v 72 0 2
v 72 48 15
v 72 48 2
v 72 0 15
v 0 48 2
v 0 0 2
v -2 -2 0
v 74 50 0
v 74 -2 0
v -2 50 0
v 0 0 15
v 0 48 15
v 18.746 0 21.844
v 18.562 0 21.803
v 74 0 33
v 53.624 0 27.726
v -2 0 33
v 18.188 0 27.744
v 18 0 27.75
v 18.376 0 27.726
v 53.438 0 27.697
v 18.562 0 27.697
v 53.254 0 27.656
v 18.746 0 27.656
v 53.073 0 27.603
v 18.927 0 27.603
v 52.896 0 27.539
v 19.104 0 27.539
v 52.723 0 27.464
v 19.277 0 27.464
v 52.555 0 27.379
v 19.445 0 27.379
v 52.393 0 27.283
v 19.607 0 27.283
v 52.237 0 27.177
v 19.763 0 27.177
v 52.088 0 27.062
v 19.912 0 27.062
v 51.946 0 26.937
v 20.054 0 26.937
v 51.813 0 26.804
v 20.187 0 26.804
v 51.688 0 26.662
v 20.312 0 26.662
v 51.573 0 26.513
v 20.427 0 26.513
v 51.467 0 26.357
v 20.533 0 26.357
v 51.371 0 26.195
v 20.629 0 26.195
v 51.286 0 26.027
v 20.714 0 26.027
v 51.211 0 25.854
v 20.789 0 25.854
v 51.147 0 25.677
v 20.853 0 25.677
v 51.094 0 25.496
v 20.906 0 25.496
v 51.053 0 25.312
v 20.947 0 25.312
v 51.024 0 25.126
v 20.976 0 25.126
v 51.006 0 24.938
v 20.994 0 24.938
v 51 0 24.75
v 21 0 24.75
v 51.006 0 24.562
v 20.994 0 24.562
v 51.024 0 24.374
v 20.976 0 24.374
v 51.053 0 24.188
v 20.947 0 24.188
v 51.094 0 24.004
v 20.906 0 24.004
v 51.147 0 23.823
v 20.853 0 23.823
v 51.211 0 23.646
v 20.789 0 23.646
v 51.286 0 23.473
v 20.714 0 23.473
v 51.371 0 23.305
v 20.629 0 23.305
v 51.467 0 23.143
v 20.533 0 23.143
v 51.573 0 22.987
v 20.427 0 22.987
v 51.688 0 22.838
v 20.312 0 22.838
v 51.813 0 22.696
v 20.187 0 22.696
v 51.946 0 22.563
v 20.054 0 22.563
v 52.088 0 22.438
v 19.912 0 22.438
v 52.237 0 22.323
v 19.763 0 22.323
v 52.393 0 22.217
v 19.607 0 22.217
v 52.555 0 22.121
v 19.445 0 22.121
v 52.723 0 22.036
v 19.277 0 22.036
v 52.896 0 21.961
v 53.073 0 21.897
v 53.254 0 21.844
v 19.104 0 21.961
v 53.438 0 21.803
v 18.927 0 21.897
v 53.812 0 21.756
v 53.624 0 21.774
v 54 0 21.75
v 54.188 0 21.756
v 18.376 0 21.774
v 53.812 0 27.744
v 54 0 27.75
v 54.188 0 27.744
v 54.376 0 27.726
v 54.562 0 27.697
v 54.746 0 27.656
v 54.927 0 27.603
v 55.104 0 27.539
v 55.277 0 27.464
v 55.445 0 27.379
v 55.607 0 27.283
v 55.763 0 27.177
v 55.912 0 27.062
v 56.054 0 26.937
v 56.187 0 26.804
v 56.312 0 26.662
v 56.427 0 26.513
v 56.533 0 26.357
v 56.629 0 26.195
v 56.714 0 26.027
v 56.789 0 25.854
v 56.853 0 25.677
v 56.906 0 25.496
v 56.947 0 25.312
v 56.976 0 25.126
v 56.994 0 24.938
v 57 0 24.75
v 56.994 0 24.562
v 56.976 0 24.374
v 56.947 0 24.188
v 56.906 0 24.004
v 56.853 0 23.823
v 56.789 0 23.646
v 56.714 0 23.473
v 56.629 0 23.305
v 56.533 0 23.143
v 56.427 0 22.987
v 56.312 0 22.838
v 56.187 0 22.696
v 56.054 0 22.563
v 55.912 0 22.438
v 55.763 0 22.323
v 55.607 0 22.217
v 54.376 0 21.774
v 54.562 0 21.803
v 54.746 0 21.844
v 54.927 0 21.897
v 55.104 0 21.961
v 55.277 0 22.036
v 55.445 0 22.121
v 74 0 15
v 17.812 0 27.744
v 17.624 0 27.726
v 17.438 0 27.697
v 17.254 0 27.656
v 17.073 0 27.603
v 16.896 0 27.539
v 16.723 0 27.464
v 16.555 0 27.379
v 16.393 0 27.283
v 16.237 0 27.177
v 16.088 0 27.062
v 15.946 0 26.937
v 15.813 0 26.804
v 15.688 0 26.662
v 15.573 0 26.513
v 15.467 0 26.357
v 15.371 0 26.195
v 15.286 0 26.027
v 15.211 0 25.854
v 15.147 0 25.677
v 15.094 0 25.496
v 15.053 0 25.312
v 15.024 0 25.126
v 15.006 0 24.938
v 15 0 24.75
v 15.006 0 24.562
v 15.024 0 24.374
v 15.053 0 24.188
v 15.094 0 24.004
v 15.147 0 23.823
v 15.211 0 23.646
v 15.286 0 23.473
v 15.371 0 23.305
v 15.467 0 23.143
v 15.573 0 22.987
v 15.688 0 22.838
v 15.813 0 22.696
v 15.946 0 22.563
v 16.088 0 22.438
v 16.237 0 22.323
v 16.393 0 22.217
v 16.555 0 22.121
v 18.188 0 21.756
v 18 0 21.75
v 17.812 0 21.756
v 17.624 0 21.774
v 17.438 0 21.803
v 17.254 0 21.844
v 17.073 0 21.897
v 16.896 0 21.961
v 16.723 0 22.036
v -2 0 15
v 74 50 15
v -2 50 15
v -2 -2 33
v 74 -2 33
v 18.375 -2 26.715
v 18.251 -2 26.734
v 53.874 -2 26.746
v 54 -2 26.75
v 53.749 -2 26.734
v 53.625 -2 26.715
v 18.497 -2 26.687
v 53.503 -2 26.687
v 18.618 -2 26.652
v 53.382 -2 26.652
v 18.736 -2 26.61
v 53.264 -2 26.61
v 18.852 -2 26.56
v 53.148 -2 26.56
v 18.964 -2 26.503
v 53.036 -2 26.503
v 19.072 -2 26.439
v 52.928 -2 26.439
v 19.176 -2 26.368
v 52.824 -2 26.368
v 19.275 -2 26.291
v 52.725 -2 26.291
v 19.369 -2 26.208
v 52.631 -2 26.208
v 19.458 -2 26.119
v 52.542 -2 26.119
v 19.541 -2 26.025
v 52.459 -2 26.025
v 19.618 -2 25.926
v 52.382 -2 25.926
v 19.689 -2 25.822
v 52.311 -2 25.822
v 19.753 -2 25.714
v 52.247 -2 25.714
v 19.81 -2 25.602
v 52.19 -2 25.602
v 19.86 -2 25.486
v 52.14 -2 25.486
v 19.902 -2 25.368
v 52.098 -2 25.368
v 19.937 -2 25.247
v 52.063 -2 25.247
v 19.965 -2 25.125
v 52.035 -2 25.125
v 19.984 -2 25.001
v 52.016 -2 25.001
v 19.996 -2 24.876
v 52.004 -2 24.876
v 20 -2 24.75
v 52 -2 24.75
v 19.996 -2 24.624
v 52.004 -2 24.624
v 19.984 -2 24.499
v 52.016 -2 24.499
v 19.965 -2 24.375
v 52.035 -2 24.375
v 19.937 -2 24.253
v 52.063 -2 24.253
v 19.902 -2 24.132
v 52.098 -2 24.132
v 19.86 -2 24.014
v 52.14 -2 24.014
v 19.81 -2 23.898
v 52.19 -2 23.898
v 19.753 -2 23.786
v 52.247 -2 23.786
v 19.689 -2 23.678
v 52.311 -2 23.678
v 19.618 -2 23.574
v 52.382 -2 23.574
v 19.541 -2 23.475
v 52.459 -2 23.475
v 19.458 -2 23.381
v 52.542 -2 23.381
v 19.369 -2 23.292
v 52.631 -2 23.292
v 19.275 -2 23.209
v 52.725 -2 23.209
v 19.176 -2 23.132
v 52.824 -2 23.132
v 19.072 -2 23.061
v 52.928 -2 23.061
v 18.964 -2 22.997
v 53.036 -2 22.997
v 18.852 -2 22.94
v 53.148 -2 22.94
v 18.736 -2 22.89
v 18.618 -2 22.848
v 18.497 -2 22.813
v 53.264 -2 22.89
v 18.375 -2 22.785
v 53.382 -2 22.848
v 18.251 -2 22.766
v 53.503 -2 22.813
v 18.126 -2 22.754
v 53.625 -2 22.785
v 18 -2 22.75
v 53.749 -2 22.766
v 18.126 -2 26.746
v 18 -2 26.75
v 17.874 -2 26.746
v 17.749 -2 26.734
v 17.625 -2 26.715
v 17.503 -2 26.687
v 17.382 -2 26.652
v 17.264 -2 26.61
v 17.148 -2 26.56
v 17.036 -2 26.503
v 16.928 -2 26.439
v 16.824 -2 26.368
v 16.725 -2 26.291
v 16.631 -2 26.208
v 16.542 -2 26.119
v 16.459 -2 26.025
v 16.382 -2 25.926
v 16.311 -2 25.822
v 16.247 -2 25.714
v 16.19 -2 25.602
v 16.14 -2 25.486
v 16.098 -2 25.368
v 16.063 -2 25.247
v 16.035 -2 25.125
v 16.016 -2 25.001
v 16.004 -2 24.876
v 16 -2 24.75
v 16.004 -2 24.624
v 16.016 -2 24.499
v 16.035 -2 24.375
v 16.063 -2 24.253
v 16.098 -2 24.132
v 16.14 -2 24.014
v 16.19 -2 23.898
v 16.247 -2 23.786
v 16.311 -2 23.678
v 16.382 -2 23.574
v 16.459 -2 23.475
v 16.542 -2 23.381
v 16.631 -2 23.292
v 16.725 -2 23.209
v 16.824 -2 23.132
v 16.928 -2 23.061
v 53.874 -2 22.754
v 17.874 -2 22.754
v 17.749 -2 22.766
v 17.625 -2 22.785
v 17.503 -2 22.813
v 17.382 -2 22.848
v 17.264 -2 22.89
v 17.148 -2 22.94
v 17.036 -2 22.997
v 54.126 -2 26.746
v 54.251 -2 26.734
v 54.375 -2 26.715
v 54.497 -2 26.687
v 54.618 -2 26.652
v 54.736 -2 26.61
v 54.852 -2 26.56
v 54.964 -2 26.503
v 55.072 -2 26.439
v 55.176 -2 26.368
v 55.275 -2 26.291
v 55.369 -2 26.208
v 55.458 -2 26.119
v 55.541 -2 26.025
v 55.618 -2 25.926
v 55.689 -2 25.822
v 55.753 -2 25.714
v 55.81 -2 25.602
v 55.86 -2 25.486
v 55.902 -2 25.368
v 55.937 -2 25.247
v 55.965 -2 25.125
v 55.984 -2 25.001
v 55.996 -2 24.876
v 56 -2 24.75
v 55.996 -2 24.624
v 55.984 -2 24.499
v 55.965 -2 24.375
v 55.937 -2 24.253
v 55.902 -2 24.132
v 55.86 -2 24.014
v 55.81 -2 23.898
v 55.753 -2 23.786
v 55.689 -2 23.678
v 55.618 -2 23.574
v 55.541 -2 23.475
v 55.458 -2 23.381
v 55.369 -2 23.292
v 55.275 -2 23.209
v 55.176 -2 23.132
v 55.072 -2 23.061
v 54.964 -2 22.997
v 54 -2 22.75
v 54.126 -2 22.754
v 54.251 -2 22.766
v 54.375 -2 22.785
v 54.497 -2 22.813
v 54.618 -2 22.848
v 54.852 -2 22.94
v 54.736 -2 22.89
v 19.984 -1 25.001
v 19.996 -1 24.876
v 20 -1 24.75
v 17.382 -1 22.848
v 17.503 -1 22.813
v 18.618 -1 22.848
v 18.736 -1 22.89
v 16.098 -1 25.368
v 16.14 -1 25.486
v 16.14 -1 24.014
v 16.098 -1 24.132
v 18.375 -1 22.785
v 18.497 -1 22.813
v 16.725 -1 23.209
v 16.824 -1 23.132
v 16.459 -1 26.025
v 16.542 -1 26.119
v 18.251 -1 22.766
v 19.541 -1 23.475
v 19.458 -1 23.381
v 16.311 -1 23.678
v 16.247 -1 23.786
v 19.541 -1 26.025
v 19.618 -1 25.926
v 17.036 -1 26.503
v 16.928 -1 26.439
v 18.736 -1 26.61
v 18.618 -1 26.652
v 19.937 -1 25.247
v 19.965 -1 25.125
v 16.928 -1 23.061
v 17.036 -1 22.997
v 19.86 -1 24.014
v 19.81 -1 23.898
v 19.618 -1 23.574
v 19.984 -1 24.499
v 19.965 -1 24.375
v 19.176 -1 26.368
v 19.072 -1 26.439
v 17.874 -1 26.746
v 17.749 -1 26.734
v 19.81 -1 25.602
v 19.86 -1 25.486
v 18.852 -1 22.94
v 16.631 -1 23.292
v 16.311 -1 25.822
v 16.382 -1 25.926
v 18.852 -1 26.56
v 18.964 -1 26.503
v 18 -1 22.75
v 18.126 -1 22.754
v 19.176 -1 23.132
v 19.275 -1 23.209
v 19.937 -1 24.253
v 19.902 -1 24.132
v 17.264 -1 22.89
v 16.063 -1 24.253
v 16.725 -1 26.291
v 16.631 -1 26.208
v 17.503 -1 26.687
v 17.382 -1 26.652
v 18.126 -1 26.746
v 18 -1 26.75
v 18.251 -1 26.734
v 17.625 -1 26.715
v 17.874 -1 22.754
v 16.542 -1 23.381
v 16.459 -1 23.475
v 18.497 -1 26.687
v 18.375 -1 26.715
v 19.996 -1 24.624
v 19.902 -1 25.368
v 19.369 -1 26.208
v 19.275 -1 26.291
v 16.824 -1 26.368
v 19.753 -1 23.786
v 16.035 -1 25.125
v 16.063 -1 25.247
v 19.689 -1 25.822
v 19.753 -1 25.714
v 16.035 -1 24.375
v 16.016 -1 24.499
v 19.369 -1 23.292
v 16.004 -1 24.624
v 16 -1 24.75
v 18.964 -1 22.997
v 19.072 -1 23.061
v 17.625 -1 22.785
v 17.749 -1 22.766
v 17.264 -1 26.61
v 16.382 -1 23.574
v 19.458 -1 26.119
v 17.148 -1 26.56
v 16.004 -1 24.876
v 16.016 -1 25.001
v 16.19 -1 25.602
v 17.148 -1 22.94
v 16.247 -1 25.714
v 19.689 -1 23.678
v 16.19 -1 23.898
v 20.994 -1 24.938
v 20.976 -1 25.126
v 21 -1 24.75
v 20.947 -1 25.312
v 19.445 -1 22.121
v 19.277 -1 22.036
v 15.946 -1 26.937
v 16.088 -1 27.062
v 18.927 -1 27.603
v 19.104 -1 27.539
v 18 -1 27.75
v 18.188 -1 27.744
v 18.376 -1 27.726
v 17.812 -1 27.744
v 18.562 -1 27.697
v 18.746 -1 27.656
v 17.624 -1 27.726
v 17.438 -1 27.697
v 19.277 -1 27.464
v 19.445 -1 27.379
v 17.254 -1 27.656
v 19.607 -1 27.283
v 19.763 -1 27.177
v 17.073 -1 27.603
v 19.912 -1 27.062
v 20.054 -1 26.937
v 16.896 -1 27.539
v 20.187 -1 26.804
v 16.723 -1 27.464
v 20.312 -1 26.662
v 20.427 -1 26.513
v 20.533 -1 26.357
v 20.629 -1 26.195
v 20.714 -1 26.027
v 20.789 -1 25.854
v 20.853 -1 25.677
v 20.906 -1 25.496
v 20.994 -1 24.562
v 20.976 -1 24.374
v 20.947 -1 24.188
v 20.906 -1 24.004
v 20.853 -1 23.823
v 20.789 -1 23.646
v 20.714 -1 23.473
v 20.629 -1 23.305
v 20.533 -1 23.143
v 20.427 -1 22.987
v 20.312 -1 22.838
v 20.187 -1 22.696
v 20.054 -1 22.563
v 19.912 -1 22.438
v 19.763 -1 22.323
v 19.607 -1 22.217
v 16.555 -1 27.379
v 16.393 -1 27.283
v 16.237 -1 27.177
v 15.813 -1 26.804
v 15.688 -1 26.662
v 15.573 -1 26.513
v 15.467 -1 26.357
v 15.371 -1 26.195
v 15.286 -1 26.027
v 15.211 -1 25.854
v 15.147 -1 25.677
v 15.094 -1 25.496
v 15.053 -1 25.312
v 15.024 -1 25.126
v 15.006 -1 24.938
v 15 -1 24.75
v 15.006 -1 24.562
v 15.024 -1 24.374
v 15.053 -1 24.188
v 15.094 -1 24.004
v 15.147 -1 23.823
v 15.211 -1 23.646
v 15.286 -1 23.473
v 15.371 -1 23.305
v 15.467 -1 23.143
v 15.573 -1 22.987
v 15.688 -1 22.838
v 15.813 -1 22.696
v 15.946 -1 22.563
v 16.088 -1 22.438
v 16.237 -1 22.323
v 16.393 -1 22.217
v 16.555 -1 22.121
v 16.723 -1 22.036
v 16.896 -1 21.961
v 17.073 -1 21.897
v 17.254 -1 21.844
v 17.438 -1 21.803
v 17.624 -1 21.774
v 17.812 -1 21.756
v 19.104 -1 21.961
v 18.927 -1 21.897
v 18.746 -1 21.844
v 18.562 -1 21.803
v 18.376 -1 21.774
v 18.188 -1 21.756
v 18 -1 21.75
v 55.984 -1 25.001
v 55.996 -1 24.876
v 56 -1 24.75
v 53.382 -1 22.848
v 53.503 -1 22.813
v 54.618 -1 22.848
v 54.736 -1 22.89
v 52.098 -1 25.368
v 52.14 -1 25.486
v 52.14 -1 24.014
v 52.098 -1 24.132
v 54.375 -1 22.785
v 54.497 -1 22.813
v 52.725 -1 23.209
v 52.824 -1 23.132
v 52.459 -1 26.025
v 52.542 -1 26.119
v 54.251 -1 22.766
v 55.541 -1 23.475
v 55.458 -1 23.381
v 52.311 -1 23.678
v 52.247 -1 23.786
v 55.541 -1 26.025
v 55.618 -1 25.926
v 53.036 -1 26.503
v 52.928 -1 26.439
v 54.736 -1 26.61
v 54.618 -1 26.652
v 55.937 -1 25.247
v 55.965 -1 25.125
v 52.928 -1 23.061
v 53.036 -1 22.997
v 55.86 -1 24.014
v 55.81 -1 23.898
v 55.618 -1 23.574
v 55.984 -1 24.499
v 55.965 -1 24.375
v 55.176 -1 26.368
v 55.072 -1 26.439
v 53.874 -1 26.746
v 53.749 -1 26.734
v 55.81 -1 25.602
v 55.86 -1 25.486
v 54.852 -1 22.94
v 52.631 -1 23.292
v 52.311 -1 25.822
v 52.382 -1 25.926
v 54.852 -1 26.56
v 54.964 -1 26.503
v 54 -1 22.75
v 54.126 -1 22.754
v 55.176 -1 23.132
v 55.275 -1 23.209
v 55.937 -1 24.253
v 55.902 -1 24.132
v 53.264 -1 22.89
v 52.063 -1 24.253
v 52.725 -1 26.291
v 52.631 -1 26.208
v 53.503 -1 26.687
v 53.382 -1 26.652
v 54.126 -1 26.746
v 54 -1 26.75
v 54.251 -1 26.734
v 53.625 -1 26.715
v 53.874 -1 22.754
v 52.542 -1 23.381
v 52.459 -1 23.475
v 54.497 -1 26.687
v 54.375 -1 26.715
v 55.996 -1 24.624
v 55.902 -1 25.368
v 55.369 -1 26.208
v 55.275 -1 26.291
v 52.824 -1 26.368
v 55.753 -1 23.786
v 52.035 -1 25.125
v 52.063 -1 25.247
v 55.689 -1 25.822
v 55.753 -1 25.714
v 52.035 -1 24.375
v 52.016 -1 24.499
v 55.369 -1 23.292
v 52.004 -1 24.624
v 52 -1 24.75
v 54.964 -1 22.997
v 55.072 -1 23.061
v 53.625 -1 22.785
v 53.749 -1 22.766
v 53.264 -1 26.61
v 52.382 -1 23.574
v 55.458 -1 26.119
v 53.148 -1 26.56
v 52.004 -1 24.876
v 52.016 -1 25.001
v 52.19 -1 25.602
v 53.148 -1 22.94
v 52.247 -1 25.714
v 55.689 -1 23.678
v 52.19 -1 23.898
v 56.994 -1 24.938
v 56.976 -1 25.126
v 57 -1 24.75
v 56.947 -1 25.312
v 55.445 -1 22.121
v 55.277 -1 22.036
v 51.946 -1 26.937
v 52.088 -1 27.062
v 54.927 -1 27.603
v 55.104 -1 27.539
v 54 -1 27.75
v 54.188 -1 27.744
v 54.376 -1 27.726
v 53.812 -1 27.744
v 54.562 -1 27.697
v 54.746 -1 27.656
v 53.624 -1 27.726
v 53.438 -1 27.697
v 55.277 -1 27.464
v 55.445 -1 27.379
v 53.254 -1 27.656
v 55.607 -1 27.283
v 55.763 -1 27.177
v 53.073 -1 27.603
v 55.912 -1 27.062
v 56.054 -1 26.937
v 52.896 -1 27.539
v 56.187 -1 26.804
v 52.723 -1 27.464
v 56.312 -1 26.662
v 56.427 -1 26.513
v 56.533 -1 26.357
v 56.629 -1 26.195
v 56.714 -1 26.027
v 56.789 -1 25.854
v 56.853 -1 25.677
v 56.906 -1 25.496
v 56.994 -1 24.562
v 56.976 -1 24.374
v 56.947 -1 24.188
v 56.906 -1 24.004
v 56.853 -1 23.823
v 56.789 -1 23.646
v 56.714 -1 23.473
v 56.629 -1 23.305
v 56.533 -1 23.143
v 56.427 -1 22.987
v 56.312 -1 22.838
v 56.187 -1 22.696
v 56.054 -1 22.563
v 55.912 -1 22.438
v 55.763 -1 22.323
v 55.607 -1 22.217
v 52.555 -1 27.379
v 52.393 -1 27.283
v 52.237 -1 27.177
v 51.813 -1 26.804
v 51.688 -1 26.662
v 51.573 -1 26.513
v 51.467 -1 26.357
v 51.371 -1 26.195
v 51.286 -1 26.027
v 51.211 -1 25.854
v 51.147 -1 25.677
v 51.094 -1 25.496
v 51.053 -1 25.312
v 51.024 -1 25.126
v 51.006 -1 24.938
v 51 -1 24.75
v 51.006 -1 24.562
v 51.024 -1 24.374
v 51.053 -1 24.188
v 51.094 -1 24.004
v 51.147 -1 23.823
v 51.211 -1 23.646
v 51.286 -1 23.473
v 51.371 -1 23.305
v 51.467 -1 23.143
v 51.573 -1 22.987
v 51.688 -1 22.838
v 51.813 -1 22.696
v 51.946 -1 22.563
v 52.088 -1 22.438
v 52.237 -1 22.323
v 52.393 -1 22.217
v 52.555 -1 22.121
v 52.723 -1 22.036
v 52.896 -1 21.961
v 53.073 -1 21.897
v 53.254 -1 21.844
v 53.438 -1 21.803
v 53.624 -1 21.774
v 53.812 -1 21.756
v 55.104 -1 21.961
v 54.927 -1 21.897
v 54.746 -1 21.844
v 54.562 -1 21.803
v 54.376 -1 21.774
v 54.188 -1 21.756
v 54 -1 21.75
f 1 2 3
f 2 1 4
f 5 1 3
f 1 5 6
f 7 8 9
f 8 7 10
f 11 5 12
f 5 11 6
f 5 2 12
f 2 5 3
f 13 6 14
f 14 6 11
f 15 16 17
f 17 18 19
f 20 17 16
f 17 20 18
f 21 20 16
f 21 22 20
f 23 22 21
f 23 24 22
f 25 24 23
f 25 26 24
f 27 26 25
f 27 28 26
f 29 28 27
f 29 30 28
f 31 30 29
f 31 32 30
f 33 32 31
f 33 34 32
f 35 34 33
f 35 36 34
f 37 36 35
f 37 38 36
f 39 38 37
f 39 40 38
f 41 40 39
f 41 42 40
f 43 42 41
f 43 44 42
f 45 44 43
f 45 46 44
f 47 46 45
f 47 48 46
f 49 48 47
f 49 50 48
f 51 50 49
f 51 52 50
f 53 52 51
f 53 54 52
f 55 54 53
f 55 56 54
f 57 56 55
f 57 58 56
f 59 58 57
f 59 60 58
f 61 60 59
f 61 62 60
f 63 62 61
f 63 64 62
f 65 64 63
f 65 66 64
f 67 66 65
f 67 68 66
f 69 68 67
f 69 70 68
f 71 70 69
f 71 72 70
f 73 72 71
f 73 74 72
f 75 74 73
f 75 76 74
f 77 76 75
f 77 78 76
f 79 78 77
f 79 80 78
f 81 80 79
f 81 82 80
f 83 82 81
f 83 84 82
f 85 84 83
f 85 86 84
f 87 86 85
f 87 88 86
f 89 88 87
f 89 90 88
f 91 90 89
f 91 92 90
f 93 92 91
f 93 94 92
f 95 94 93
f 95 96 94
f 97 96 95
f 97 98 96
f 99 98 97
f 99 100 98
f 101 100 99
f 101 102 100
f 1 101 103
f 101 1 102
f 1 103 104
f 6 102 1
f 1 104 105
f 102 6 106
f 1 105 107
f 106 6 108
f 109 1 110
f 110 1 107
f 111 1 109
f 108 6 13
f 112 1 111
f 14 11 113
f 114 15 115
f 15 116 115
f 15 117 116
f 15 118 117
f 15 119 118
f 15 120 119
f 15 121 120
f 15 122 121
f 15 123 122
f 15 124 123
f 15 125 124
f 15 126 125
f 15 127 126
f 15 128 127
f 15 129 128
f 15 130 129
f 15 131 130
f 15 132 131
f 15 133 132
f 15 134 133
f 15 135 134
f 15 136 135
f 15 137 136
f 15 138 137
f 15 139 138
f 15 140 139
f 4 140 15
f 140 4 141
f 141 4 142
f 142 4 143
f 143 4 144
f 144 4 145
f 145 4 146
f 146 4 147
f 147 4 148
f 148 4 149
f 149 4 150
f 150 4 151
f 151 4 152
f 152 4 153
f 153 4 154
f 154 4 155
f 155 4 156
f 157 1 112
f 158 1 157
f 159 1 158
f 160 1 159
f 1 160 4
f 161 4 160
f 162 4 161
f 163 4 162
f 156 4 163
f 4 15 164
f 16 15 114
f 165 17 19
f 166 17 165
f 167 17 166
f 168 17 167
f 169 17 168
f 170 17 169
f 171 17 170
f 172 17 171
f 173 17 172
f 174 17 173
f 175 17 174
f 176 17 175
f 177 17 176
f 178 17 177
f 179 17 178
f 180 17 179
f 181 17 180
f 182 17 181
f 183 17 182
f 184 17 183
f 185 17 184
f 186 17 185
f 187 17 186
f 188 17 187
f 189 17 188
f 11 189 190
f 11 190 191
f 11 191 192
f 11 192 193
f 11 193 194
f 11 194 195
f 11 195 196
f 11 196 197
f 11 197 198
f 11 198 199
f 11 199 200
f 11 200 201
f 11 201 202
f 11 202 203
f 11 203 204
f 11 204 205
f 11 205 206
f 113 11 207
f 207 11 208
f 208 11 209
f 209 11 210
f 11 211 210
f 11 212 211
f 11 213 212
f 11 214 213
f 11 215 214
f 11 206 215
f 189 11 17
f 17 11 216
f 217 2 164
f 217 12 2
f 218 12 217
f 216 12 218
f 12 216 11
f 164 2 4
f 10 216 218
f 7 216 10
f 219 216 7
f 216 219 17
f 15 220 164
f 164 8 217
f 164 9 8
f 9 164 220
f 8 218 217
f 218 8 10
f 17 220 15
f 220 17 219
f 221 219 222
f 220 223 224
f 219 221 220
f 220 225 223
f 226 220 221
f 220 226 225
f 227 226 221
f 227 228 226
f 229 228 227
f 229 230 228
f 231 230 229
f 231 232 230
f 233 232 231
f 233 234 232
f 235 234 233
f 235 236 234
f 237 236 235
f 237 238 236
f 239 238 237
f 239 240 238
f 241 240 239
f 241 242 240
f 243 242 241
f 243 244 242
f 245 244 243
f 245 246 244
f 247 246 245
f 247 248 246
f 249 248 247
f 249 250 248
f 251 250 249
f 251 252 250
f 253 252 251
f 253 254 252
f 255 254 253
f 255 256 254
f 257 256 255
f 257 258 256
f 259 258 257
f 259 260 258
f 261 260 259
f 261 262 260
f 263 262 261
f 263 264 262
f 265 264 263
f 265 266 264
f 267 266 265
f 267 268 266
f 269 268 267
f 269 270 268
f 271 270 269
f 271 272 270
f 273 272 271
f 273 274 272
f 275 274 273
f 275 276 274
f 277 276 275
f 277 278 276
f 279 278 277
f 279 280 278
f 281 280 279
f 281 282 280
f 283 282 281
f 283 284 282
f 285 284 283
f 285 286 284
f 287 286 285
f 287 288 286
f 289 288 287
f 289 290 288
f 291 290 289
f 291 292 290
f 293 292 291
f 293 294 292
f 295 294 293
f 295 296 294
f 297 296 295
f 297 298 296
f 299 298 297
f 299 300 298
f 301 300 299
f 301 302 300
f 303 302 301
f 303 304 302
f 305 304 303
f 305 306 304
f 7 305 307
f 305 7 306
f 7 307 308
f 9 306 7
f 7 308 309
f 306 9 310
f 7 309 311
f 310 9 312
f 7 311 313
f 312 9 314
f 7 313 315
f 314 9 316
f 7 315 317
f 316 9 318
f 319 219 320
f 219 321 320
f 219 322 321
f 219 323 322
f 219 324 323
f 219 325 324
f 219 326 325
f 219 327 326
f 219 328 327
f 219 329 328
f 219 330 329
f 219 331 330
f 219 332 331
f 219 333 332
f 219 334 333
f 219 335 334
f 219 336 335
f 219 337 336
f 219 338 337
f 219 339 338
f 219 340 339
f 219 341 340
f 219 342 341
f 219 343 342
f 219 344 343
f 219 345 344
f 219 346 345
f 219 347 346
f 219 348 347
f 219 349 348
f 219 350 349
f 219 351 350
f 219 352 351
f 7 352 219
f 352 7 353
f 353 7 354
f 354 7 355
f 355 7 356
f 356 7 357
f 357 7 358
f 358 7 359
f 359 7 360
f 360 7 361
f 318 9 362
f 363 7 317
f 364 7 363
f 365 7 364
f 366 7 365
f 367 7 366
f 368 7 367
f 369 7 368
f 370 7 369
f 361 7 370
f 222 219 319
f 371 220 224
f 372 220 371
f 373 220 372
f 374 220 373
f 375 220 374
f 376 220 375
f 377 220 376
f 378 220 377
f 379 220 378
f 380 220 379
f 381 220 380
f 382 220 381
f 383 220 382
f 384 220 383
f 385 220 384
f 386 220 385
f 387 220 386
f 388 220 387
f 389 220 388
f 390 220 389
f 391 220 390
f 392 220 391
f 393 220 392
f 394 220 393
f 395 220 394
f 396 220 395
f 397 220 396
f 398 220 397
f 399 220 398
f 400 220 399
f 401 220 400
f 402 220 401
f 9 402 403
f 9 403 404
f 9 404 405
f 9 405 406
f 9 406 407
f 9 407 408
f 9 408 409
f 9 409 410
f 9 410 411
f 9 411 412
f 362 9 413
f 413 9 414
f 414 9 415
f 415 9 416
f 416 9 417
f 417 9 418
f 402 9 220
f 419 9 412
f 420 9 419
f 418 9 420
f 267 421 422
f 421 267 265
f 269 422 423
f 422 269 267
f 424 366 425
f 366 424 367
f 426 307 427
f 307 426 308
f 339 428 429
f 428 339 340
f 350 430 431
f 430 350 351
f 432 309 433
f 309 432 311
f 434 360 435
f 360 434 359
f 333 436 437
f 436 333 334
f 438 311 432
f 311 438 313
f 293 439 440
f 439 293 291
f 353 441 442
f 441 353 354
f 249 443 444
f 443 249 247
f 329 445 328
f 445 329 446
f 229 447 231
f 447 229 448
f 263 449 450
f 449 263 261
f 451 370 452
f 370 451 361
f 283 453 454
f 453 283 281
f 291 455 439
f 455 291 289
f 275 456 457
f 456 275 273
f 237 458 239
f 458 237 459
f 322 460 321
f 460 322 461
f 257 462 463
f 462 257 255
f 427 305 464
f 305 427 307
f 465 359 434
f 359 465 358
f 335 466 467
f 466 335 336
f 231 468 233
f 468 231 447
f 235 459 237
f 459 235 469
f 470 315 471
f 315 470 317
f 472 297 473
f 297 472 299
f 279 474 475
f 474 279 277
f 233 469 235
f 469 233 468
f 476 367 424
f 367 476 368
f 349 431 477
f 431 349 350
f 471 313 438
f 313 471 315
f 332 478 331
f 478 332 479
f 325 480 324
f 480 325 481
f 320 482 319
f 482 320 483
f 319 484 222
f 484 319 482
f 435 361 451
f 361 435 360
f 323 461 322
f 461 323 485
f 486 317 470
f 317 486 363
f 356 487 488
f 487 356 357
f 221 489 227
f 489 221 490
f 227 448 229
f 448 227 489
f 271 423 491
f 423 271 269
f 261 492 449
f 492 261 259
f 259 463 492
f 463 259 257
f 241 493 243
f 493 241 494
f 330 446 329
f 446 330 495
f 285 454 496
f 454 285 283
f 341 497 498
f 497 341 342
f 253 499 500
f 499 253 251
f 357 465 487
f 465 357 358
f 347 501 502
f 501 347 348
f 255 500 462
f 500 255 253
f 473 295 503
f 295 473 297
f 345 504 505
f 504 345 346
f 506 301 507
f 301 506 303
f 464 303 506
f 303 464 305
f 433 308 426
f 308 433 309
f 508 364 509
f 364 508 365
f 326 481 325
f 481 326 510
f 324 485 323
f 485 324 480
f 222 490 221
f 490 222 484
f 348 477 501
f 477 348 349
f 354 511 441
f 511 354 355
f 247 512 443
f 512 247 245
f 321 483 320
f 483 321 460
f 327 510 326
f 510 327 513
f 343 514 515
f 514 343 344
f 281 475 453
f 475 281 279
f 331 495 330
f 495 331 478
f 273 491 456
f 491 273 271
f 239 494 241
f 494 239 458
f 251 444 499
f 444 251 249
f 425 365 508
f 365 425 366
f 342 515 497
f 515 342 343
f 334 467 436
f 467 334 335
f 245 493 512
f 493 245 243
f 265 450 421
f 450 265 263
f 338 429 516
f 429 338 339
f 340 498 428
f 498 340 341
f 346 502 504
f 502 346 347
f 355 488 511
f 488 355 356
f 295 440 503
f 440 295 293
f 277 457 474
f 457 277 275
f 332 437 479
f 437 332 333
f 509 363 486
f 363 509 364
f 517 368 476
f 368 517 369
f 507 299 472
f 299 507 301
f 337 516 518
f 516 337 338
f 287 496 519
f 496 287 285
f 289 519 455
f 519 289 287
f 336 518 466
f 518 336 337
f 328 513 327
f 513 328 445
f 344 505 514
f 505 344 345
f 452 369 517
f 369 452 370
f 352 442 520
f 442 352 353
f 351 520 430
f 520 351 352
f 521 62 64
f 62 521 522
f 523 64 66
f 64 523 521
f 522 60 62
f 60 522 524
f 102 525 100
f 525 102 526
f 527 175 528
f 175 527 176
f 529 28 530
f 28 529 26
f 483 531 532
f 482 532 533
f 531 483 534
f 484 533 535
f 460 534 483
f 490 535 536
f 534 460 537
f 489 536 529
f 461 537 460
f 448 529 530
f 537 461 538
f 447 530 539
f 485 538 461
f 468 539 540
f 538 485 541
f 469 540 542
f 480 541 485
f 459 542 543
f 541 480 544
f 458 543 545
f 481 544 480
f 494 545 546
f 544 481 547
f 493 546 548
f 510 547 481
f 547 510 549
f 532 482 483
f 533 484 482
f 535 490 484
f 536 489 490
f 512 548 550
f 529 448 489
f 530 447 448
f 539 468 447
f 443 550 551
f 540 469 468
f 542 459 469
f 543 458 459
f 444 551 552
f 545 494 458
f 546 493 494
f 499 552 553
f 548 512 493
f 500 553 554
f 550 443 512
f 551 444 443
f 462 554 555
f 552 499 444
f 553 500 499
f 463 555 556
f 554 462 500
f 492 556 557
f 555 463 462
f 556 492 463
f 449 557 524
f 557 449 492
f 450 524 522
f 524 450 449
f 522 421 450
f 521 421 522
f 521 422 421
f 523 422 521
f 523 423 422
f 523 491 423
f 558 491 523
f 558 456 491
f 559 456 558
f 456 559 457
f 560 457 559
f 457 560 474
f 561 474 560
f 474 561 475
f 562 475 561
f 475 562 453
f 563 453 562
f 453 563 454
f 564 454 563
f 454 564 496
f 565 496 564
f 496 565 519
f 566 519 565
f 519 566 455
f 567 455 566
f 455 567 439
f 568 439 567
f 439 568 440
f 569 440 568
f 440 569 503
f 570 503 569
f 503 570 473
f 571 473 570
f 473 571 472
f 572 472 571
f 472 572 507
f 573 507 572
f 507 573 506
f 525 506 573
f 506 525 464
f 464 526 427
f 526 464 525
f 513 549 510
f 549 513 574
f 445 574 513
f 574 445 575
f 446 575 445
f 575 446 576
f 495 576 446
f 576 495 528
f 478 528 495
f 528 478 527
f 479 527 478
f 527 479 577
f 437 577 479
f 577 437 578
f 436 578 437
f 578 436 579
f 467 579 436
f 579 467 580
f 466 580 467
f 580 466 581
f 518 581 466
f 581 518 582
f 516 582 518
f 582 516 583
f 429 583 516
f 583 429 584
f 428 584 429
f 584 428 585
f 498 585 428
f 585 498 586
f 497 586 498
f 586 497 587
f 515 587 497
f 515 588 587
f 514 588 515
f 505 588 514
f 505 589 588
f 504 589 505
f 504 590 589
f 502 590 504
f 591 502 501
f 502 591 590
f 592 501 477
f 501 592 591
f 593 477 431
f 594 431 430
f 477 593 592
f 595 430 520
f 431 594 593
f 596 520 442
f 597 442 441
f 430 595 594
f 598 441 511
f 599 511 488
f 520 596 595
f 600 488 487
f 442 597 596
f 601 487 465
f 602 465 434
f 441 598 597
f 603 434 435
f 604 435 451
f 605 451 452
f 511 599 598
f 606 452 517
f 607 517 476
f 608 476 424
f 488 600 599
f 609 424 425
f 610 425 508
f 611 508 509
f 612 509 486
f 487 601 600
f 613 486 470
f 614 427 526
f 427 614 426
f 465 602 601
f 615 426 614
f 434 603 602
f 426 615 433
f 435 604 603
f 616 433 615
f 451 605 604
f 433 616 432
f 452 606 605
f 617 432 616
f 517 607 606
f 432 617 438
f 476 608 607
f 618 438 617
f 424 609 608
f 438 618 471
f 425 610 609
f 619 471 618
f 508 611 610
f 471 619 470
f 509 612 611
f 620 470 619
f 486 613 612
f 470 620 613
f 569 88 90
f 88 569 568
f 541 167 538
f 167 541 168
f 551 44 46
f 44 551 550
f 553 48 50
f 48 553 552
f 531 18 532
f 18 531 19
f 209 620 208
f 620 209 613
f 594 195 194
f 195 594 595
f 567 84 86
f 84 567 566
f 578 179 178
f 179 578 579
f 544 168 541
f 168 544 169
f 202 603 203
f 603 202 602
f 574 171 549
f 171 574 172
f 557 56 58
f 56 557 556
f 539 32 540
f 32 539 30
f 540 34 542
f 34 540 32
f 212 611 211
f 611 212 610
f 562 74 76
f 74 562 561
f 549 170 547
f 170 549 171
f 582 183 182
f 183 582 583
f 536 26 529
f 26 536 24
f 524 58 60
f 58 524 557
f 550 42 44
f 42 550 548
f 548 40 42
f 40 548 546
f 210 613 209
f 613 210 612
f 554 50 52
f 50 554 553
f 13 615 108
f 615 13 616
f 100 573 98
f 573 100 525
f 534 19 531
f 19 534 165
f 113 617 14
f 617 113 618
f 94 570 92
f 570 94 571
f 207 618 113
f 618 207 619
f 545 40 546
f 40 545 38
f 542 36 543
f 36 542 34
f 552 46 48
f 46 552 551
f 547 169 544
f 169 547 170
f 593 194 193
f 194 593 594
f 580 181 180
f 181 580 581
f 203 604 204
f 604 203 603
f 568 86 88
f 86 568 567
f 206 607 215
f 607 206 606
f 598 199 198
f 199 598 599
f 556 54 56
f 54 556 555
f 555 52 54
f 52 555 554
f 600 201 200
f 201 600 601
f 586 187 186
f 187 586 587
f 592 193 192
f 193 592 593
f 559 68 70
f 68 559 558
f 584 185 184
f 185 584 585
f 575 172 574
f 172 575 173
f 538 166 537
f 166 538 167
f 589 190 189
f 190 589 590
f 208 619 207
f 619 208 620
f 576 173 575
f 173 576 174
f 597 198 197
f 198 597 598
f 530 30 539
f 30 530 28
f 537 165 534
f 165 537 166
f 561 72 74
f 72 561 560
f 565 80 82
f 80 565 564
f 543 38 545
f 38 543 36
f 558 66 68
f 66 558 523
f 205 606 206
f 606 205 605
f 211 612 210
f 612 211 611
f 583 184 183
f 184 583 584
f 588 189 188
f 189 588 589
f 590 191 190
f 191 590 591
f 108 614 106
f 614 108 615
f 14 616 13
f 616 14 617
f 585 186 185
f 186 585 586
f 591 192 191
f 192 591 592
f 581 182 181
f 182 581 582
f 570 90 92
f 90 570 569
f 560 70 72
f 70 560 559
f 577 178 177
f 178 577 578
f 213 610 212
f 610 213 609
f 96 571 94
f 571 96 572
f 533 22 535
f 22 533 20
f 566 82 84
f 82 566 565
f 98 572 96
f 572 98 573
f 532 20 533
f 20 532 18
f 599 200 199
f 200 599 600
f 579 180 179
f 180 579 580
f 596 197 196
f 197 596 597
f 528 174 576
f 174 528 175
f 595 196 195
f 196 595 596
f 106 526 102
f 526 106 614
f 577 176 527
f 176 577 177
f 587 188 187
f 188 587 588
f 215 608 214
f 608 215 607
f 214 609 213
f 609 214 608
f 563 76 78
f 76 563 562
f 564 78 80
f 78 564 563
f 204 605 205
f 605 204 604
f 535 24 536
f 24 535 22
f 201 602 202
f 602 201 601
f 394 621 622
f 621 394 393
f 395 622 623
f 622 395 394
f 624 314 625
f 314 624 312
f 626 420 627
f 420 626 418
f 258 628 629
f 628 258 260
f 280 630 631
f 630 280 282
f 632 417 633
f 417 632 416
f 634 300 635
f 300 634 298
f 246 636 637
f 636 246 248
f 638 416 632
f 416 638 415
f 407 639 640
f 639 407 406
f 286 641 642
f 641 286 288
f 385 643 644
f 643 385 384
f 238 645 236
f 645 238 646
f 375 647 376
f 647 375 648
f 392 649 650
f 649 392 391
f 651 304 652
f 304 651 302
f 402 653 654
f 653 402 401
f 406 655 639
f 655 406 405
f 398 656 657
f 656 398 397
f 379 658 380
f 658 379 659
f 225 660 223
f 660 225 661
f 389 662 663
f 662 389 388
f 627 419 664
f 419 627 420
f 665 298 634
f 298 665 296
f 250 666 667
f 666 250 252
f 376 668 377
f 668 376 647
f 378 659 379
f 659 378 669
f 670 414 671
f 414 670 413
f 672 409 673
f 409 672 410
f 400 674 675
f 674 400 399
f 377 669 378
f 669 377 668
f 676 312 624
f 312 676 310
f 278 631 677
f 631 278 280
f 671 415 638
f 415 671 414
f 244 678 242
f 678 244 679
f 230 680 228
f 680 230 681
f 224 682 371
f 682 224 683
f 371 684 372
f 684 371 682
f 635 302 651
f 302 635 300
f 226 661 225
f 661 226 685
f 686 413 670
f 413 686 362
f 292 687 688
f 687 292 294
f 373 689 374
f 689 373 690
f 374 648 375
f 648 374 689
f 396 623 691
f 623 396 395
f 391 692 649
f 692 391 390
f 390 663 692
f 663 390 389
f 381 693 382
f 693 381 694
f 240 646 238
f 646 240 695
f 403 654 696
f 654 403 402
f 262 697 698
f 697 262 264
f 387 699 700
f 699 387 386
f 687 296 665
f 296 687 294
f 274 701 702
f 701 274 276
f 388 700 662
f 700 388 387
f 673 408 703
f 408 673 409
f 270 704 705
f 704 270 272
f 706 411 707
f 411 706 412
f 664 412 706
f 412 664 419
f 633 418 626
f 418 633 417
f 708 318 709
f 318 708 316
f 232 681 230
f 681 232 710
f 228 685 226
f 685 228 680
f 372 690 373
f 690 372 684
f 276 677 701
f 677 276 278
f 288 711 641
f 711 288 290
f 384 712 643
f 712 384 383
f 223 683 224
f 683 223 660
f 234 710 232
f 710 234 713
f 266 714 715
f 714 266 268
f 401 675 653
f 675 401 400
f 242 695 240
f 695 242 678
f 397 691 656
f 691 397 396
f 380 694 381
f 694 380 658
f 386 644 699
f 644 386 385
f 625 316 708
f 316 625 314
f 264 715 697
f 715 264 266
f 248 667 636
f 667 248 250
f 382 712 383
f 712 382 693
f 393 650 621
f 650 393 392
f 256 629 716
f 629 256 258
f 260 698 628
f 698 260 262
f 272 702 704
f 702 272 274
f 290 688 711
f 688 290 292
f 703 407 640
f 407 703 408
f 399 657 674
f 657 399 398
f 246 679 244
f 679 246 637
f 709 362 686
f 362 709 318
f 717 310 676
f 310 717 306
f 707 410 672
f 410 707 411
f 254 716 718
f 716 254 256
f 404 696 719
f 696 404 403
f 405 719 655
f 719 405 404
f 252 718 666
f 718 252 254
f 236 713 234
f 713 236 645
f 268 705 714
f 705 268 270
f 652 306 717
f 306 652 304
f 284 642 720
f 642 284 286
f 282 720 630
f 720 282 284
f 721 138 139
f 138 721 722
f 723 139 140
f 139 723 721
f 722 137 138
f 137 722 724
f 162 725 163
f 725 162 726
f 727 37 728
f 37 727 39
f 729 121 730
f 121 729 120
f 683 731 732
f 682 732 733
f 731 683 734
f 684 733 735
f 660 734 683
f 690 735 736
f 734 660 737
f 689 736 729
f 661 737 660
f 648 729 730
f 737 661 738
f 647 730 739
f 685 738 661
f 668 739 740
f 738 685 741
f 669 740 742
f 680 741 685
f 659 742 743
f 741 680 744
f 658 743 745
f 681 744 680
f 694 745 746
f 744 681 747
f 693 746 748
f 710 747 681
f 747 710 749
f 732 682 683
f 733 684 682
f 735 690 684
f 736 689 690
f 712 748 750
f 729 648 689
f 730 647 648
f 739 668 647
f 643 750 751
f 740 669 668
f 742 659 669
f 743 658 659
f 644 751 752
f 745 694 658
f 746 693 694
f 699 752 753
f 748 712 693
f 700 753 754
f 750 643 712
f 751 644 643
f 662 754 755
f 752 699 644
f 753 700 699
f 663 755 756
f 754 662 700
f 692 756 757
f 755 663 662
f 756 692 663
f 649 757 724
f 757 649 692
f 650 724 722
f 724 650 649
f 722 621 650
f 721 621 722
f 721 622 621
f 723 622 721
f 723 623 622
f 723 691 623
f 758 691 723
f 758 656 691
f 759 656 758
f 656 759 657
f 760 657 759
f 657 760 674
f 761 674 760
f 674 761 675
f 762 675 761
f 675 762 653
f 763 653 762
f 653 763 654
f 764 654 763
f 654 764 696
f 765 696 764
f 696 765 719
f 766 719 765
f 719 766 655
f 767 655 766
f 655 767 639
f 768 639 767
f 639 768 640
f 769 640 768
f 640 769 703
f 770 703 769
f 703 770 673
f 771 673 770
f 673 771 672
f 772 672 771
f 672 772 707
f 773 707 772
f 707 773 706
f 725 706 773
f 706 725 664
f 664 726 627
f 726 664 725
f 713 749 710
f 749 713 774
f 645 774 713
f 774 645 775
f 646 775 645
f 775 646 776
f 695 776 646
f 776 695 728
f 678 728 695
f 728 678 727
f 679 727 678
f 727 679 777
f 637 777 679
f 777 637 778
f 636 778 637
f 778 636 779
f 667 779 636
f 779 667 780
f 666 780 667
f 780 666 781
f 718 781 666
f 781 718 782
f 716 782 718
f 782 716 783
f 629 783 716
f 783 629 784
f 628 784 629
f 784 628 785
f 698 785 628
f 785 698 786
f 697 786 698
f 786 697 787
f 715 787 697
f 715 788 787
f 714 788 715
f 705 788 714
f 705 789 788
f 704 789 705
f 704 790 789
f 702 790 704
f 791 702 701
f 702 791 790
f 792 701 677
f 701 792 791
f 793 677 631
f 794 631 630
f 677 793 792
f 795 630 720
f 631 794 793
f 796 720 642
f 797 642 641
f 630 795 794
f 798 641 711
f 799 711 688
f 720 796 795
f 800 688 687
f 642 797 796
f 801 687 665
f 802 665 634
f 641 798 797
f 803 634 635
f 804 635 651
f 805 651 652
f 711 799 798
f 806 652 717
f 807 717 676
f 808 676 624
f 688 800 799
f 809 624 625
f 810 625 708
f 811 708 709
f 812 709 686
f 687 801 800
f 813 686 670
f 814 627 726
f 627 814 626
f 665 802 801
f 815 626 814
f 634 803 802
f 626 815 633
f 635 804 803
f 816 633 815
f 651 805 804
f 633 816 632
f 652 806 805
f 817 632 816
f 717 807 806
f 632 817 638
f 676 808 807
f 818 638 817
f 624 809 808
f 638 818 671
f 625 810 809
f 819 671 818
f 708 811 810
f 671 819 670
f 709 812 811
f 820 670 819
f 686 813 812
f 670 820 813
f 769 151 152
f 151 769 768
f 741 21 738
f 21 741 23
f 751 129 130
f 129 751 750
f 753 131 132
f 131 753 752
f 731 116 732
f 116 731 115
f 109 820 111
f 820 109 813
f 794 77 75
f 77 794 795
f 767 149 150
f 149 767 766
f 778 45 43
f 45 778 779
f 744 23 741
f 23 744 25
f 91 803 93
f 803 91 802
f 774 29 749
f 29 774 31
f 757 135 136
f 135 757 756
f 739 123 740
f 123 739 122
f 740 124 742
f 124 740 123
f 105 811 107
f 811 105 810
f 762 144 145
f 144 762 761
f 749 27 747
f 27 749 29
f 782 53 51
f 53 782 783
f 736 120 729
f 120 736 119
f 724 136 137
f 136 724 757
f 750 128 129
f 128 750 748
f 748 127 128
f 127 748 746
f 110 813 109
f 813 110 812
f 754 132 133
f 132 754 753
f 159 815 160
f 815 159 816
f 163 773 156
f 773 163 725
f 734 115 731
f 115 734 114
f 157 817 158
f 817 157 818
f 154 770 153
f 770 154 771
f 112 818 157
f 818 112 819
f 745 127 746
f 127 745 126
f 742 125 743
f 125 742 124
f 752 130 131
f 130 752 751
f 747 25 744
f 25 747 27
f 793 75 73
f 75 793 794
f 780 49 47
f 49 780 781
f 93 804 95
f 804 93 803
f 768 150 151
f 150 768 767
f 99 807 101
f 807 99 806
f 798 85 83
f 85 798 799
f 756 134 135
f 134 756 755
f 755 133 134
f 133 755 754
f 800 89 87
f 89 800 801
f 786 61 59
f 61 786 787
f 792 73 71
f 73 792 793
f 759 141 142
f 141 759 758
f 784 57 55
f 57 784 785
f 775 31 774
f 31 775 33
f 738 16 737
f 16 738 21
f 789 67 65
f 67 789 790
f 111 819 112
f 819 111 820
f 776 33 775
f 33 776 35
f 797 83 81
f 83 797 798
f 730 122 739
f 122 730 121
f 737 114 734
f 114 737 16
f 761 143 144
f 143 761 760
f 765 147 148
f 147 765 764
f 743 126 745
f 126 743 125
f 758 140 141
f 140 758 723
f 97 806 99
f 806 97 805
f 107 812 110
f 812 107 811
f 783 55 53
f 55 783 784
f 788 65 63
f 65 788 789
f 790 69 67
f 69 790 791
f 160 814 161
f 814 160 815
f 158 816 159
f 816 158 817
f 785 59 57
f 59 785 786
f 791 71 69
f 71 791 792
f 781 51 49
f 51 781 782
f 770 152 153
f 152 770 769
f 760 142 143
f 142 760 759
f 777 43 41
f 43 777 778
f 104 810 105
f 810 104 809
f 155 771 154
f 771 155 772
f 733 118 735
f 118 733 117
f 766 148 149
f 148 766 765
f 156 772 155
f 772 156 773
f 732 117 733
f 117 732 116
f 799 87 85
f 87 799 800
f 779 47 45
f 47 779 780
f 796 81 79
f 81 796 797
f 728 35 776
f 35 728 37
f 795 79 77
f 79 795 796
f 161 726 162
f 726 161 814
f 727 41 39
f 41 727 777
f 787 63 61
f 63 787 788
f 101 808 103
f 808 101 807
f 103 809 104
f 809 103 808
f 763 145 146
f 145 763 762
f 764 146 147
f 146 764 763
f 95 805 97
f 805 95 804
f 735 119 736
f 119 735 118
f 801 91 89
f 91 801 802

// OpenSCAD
{ // Part dimension
  width_x = 72;
  depth_y = 48;
  front_height_z = 15;
  back_height_z = 33;
  thickness = 2;
  hole_diameter = 4;

  $fn = 100;
}

module box() {
  cube([width_x, depth_y, thickness]);
  // walls
  translate([-thickness, 0, 0]) {
    cube([thickness, depth_y, front_height_z]);
  }
  translate([width_x, 0, 0]) {
    cube([thickness, depth_y, front_height_z]);
  }
  translate([-thickness, depth_y, 0]) {
    cube([width_x + 2*thickness, thickness, front_height_z]);
  }
  translate([-thickness, -thickness, 0]) {
    cube([width_x + 2*thickness, thickness, back_height_z]);
  }
}

module holes() {
  translate([width_x/4, 0, 3*back_height_z/4]) {
    rotate([90, 0, 0]) {
      cylinder(d=hole_diameter, h=thickness);
      cylinder(d=hole_diameter+2, h=1);
    }
  }
  translate([3*width_x/4, 0, 3*back_height_z/4]) {
    rotate([90, 0, 0]) {
      cylinder(d=hole_diameter, h=thickness);
      cylinder(d=hole_diameter+2, h=1);
    }
  }
}
module part() {
  difference() {
    box();
    holes();
  }
}

part();
